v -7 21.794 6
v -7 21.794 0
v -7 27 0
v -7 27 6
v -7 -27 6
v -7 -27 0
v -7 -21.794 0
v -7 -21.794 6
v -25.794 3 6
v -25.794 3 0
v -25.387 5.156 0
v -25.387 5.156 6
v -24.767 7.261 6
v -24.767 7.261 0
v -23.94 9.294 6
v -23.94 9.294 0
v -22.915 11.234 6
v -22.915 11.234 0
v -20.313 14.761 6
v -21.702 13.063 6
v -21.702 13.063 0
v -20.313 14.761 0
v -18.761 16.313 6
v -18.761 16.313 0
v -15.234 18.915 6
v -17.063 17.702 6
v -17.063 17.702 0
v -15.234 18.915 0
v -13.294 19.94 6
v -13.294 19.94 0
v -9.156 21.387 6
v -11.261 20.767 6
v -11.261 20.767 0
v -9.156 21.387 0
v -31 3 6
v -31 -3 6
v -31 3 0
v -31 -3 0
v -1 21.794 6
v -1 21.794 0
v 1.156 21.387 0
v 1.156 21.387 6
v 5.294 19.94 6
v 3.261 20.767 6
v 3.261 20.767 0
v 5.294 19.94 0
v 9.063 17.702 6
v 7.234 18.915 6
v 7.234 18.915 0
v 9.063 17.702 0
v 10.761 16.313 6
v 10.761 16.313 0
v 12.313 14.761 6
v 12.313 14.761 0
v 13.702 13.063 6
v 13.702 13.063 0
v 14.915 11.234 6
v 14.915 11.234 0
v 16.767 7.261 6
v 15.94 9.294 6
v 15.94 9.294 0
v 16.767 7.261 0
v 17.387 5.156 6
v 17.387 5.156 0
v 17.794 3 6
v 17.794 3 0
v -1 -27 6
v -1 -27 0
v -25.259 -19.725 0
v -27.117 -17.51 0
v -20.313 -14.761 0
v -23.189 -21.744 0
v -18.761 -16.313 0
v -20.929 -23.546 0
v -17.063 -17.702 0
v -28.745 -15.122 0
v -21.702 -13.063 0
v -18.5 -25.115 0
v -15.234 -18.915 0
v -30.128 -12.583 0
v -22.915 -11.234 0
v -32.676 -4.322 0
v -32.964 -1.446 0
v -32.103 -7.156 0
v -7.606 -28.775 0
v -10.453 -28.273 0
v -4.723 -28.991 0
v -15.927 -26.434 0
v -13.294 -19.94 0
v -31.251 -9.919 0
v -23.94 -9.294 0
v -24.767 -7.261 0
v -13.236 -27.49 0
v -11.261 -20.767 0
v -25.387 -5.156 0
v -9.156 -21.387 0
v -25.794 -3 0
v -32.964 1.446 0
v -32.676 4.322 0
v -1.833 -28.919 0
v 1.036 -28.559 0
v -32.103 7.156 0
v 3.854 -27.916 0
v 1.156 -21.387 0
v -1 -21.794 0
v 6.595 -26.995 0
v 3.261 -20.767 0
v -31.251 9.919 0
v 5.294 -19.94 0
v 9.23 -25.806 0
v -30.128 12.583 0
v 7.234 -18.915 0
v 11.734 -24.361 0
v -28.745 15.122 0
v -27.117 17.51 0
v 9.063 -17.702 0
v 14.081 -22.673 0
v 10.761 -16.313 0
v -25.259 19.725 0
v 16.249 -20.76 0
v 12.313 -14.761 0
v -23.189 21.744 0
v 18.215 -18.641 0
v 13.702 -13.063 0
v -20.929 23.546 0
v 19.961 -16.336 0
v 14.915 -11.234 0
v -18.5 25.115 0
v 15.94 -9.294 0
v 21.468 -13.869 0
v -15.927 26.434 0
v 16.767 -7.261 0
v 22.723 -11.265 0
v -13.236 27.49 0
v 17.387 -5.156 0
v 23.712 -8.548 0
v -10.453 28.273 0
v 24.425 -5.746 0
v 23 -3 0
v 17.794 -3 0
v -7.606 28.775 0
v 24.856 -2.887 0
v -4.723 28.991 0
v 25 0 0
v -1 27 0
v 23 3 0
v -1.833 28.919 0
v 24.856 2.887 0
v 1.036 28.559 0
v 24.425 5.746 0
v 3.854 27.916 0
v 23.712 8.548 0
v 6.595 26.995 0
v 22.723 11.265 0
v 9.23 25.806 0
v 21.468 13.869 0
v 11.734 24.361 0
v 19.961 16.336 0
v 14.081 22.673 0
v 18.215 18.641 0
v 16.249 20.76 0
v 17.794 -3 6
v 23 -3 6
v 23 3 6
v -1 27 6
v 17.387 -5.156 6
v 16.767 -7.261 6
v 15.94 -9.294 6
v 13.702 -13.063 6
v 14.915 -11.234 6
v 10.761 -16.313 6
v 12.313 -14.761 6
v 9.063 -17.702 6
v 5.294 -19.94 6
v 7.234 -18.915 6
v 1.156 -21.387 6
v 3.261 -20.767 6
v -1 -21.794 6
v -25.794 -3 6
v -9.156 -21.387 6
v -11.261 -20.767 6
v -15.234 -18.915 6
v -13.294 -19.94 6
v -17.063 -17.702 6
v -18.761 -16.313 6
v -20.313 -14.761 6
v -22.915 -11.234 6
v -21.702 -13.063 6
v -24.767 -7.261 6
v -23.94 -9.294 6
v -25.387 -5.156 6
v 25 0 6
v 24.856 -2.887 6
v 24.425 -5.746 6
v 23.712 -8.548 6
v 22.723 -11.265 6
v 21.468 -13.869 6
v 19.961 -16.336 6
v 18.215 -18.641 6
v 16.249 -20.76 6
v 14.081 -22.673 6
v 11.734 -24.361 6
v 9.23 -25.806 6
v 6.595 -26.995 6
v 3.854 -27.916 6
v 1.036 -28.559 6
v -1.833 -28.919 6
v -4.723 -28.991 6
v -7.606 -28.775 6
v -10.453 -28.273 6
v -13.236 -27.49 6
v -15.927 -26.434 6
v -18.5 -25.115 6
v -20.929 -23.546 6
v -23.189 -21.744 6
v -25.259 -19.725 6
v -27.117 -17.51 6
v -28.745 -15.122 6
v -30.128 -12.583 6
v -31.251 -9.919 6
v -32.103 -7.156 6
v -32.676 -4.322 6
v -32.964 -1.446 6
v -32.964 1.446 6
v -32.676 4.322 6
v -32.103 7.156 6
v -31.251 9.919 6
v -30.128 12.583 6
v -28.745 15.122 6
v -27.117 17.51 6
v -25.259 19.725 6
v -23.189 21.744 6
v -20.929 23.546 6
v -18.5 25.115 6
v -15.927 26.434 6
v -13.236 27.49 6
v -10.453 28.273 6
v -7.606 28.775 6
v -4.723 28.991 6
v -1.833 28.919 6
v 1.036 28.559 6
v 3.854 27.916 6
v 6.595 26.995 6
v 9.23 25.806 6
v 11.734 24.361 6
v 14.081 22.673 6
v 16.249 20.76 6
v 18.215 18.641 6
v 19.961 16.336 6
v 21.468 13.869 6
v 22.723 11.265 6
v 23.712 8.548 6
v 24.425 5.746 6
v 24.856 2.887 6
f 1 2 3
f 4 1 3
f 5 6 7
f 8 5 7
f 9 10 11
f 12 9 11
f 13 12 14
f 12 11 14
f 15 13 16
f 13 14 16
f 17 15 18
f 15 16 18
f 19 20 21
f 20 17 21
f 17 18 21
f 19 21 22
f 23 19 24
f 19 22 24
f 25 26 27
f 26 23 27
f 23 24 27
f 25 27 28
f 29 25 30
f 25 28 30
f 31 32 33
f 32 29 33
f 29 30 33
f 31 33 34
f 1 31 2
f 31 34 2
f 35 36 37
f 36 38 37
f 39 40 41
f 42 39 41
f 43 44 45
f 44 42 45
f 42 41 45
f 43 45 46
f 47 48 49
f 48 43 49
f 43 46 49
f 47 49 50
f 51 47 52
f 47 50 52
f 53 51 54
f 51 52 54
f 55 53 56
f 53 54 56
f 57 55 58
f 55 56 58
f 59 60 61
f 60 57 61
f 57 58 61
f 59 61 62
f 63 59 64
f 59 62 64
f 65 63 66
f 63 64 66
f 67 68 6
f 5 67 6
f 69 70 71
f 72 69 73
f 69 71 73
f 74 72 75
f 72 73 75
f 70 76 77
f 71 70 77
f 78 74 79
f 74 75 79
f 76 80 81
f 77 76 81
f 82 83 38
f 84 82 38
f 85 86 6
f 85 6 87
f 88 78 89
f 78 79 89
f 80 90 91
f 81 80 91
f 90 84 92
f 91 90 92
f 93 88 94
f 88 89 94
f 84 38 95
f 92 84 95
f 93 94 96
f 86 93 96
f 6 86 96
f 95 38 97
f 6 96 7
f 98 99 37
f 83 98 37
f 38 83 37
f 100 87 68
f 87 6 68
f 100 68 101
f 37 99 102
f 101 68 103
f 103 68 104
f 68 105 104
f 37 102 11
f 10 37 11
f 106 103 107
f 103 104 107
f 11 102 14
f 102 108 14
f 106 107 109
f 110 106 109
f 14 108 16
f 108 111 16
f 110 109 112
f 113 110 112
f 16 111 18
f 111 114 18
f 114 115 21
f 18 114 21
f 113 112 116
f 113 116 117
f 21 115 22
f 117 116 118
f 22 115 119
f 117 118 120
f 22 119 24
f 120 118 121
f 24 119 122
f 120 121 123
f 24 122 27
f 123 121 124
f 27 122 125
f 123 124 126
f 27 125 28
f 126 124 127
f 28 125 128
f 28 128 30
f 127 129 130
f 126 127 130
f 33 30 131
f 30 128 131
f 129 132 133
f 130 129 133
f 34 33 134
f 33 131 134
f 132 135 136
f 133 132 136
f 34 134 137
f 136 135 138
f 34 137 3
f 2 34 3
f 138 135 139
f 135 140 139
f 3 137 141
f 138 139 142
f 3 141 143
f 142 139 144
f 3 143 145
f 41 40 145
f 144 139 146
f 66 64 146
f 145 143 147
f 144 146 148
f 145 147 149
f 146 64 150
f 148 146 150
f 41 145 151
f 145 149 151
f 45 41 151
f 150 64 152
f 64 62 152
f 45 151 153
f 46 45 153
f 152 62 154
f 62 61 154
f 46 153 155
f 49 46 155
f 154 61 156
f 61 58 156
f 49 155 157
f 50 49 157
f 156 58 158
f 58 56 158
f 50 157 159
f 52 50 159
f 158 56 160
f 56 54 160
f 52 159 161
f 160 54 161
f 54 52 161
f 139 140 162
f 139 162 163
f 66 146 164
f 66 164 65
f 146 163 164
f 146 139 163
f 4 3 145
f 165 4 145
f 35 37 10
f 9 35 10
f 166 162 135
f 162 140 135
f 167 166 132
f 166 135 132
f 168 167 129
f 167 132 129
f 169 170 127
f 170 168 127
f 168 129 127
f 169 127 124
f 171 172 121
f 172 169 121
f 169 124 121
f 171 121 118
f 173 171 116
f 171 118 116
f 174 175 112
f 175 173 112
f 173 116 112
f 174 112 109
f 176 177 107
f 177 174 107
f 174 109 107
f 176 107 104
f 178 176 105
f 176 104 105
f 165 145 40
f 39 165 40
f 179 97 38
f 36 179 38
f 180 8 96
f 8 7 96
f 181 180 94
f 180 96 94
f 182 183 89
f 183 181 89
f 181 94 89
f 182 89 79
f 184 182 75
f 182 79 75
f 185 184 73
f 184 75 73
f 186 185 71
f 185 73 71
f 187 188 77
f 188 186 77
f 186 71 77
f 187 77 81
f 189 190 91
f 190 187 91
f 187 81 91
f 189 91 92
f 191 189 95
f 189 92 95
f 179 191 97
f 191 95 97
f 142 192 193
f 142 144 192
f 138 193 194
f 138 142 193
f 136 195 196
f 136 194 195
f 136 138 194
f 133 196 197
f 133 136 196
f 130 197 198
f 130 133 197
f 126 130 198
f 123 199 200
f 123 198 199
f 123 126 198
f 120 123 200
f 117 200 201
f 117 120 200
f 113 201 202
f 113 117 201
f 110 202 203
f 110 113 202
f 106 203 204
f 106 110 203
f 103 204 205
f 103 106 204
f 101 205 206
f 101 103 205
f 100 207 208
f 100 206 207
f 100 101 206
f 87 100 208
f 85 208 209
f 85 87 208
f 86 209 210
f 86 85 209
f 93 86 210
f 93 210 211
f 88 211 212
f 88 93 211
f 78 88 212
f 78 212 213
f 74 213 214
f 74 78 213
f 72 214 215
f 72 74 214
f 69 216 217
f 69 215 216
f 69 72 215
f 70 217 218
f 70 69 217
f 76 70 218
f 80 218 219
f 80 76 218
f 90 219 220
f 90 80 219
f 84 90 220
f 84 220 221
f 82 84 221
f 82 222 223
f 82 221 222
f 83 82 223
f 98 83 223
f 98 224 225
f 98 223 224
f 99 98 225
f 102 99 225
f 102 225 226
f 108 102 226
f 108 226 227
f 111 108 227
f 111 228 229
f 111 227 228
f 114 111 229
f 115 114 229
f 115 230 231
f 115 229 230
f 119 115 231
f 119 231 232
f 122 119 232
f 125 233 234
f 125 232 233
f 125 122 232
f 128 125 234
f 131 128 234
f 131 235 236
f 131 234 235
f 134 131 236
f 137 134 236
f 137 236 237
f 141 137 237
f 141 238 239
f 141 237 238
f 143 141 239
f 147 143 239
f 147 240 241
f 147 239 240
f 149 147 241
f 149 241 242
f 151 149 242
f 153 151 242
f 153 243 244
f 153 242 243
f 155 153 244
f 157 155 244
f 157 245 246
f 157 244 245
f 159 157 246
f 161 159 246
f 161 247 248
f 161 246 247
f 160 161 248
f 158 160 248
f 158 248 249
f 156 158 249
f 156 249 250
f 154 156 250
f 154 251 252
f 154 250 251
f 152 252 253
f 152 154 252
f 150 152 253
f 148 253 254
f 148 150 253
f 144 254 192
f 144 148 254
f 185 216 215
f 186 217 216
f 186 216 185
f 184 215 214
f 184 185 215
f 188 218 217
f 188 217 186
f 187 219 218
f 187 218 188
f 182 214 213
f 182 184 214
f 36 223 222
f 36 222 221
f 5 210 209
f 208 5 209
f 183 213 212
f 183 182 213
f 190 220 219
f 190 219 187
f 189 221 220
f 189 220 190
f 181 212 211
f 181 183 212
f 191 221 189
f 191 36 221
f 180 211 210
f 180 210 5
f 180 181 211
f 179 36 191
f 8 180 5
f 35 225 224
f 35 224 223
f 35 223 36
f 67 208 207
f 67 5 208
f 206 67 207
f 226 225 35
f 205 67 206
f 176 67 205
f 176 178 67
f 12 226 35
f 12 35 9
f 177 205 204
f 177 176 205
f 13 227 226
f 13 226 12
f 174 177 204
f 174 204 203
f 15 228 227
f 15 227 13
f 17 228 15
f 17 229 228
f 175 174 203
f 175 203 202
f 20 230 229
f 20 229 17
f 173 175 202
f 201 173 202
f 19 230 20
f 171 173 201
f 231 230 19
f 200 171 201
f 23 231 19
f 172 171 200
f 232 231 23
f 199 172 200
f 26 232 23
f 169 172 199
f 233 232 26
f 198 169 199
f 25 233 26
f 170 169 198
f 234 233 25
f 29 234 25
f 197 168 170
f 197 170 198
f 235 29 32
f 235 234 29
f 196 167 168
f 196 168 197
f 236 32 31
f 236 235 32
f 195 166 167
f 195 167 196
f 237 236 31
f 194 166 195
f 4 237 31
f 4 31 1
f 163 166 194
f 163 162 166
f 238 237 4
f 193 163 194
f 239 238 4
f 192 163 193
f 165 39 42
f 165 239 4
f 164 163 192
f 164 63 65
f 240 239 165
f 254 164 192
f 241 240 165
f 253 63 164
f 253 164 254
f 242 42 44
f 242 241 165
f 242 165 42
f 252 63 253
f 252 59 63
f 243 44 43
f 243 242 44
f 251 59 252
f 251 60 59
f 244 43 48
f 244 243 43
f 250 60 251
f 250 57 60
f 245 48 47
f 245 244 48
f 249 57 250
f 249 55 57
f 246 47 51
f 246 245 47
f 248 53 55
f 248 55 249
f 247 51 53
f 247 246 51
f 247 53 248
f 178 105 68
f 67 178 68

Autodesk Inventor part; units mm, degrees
ref_plane "YZ Plane" through (0, 0, 0) normal (1, 0, 0) x (0, 1, 0)
ref_plane "XZ Plane" through (0, 0, 0) normal (0, 1, 0) x (-1, 0, 0)
ref_plane "XY Plane" through (0, 0, 0) normal (0, 0, 1) x (1, 0, 0)
sketch "Sketch1" plane through (0, 0, 0) normal (0, 0, 1) x (1, 0, 0)
  line L0 (-25, -3) -> (-25, 3)
  line L1 (17, -3) -> (17, 3)
  line L2 (-25, -3) -> (-31, -3)
  line L3 (-31, -3) -> (-31, 3)
  line L4 (-31, 3) -> (-25, 3)
  line L5 (-25, 3) -> (-25, -3)
  line L6 (17, -3) -> (23, -3)
  line L7 (23, -3) -> (23, 3)
  line L8 (23, 3) -> (17, 3)
  line L9 (17, 3) -> (17, -3)
  circle A0 centre (-4, 0) radius 29
  line L10 (-1, -21) -> (-1, -27)
  line L11 (-1, -27) -> (-7, -27)
  line L12 (-7, -27) -> (-7, -21)
  line L13 (-7, -21) -> (-1, -21)
  line L14 (17, 3) -> (23, 3)
  line L15 (23, 3) -> (23, -3)
  line L16 (23, -3) -> (17, -3)
  line L17 (17, -3) -> (17, 3)
  line L18 (-7, 21) -> (-7, 27)
  line L19 (-7, 27) -> (-1, 27)
  line L20 (-1, 27) -> (-1, 21)
  line L21 (-1, 21) -> (-7, 21)
  circle A1 centre (-4, 0) radius 22
  line L22 (-4, 0) -> (17, 0)
  point P0 (-7, -21)
  point P1 (-1, 21)
  dimension "d10" = 6
  dimension "d12" = 6
  dimension "d21" = 360
  dimension "d25" = 44
  dimension "d29" = 21
  dimension "d30" = 21
extrude "Extrusion1" add sketch "Sketch1" along normal blind 6
